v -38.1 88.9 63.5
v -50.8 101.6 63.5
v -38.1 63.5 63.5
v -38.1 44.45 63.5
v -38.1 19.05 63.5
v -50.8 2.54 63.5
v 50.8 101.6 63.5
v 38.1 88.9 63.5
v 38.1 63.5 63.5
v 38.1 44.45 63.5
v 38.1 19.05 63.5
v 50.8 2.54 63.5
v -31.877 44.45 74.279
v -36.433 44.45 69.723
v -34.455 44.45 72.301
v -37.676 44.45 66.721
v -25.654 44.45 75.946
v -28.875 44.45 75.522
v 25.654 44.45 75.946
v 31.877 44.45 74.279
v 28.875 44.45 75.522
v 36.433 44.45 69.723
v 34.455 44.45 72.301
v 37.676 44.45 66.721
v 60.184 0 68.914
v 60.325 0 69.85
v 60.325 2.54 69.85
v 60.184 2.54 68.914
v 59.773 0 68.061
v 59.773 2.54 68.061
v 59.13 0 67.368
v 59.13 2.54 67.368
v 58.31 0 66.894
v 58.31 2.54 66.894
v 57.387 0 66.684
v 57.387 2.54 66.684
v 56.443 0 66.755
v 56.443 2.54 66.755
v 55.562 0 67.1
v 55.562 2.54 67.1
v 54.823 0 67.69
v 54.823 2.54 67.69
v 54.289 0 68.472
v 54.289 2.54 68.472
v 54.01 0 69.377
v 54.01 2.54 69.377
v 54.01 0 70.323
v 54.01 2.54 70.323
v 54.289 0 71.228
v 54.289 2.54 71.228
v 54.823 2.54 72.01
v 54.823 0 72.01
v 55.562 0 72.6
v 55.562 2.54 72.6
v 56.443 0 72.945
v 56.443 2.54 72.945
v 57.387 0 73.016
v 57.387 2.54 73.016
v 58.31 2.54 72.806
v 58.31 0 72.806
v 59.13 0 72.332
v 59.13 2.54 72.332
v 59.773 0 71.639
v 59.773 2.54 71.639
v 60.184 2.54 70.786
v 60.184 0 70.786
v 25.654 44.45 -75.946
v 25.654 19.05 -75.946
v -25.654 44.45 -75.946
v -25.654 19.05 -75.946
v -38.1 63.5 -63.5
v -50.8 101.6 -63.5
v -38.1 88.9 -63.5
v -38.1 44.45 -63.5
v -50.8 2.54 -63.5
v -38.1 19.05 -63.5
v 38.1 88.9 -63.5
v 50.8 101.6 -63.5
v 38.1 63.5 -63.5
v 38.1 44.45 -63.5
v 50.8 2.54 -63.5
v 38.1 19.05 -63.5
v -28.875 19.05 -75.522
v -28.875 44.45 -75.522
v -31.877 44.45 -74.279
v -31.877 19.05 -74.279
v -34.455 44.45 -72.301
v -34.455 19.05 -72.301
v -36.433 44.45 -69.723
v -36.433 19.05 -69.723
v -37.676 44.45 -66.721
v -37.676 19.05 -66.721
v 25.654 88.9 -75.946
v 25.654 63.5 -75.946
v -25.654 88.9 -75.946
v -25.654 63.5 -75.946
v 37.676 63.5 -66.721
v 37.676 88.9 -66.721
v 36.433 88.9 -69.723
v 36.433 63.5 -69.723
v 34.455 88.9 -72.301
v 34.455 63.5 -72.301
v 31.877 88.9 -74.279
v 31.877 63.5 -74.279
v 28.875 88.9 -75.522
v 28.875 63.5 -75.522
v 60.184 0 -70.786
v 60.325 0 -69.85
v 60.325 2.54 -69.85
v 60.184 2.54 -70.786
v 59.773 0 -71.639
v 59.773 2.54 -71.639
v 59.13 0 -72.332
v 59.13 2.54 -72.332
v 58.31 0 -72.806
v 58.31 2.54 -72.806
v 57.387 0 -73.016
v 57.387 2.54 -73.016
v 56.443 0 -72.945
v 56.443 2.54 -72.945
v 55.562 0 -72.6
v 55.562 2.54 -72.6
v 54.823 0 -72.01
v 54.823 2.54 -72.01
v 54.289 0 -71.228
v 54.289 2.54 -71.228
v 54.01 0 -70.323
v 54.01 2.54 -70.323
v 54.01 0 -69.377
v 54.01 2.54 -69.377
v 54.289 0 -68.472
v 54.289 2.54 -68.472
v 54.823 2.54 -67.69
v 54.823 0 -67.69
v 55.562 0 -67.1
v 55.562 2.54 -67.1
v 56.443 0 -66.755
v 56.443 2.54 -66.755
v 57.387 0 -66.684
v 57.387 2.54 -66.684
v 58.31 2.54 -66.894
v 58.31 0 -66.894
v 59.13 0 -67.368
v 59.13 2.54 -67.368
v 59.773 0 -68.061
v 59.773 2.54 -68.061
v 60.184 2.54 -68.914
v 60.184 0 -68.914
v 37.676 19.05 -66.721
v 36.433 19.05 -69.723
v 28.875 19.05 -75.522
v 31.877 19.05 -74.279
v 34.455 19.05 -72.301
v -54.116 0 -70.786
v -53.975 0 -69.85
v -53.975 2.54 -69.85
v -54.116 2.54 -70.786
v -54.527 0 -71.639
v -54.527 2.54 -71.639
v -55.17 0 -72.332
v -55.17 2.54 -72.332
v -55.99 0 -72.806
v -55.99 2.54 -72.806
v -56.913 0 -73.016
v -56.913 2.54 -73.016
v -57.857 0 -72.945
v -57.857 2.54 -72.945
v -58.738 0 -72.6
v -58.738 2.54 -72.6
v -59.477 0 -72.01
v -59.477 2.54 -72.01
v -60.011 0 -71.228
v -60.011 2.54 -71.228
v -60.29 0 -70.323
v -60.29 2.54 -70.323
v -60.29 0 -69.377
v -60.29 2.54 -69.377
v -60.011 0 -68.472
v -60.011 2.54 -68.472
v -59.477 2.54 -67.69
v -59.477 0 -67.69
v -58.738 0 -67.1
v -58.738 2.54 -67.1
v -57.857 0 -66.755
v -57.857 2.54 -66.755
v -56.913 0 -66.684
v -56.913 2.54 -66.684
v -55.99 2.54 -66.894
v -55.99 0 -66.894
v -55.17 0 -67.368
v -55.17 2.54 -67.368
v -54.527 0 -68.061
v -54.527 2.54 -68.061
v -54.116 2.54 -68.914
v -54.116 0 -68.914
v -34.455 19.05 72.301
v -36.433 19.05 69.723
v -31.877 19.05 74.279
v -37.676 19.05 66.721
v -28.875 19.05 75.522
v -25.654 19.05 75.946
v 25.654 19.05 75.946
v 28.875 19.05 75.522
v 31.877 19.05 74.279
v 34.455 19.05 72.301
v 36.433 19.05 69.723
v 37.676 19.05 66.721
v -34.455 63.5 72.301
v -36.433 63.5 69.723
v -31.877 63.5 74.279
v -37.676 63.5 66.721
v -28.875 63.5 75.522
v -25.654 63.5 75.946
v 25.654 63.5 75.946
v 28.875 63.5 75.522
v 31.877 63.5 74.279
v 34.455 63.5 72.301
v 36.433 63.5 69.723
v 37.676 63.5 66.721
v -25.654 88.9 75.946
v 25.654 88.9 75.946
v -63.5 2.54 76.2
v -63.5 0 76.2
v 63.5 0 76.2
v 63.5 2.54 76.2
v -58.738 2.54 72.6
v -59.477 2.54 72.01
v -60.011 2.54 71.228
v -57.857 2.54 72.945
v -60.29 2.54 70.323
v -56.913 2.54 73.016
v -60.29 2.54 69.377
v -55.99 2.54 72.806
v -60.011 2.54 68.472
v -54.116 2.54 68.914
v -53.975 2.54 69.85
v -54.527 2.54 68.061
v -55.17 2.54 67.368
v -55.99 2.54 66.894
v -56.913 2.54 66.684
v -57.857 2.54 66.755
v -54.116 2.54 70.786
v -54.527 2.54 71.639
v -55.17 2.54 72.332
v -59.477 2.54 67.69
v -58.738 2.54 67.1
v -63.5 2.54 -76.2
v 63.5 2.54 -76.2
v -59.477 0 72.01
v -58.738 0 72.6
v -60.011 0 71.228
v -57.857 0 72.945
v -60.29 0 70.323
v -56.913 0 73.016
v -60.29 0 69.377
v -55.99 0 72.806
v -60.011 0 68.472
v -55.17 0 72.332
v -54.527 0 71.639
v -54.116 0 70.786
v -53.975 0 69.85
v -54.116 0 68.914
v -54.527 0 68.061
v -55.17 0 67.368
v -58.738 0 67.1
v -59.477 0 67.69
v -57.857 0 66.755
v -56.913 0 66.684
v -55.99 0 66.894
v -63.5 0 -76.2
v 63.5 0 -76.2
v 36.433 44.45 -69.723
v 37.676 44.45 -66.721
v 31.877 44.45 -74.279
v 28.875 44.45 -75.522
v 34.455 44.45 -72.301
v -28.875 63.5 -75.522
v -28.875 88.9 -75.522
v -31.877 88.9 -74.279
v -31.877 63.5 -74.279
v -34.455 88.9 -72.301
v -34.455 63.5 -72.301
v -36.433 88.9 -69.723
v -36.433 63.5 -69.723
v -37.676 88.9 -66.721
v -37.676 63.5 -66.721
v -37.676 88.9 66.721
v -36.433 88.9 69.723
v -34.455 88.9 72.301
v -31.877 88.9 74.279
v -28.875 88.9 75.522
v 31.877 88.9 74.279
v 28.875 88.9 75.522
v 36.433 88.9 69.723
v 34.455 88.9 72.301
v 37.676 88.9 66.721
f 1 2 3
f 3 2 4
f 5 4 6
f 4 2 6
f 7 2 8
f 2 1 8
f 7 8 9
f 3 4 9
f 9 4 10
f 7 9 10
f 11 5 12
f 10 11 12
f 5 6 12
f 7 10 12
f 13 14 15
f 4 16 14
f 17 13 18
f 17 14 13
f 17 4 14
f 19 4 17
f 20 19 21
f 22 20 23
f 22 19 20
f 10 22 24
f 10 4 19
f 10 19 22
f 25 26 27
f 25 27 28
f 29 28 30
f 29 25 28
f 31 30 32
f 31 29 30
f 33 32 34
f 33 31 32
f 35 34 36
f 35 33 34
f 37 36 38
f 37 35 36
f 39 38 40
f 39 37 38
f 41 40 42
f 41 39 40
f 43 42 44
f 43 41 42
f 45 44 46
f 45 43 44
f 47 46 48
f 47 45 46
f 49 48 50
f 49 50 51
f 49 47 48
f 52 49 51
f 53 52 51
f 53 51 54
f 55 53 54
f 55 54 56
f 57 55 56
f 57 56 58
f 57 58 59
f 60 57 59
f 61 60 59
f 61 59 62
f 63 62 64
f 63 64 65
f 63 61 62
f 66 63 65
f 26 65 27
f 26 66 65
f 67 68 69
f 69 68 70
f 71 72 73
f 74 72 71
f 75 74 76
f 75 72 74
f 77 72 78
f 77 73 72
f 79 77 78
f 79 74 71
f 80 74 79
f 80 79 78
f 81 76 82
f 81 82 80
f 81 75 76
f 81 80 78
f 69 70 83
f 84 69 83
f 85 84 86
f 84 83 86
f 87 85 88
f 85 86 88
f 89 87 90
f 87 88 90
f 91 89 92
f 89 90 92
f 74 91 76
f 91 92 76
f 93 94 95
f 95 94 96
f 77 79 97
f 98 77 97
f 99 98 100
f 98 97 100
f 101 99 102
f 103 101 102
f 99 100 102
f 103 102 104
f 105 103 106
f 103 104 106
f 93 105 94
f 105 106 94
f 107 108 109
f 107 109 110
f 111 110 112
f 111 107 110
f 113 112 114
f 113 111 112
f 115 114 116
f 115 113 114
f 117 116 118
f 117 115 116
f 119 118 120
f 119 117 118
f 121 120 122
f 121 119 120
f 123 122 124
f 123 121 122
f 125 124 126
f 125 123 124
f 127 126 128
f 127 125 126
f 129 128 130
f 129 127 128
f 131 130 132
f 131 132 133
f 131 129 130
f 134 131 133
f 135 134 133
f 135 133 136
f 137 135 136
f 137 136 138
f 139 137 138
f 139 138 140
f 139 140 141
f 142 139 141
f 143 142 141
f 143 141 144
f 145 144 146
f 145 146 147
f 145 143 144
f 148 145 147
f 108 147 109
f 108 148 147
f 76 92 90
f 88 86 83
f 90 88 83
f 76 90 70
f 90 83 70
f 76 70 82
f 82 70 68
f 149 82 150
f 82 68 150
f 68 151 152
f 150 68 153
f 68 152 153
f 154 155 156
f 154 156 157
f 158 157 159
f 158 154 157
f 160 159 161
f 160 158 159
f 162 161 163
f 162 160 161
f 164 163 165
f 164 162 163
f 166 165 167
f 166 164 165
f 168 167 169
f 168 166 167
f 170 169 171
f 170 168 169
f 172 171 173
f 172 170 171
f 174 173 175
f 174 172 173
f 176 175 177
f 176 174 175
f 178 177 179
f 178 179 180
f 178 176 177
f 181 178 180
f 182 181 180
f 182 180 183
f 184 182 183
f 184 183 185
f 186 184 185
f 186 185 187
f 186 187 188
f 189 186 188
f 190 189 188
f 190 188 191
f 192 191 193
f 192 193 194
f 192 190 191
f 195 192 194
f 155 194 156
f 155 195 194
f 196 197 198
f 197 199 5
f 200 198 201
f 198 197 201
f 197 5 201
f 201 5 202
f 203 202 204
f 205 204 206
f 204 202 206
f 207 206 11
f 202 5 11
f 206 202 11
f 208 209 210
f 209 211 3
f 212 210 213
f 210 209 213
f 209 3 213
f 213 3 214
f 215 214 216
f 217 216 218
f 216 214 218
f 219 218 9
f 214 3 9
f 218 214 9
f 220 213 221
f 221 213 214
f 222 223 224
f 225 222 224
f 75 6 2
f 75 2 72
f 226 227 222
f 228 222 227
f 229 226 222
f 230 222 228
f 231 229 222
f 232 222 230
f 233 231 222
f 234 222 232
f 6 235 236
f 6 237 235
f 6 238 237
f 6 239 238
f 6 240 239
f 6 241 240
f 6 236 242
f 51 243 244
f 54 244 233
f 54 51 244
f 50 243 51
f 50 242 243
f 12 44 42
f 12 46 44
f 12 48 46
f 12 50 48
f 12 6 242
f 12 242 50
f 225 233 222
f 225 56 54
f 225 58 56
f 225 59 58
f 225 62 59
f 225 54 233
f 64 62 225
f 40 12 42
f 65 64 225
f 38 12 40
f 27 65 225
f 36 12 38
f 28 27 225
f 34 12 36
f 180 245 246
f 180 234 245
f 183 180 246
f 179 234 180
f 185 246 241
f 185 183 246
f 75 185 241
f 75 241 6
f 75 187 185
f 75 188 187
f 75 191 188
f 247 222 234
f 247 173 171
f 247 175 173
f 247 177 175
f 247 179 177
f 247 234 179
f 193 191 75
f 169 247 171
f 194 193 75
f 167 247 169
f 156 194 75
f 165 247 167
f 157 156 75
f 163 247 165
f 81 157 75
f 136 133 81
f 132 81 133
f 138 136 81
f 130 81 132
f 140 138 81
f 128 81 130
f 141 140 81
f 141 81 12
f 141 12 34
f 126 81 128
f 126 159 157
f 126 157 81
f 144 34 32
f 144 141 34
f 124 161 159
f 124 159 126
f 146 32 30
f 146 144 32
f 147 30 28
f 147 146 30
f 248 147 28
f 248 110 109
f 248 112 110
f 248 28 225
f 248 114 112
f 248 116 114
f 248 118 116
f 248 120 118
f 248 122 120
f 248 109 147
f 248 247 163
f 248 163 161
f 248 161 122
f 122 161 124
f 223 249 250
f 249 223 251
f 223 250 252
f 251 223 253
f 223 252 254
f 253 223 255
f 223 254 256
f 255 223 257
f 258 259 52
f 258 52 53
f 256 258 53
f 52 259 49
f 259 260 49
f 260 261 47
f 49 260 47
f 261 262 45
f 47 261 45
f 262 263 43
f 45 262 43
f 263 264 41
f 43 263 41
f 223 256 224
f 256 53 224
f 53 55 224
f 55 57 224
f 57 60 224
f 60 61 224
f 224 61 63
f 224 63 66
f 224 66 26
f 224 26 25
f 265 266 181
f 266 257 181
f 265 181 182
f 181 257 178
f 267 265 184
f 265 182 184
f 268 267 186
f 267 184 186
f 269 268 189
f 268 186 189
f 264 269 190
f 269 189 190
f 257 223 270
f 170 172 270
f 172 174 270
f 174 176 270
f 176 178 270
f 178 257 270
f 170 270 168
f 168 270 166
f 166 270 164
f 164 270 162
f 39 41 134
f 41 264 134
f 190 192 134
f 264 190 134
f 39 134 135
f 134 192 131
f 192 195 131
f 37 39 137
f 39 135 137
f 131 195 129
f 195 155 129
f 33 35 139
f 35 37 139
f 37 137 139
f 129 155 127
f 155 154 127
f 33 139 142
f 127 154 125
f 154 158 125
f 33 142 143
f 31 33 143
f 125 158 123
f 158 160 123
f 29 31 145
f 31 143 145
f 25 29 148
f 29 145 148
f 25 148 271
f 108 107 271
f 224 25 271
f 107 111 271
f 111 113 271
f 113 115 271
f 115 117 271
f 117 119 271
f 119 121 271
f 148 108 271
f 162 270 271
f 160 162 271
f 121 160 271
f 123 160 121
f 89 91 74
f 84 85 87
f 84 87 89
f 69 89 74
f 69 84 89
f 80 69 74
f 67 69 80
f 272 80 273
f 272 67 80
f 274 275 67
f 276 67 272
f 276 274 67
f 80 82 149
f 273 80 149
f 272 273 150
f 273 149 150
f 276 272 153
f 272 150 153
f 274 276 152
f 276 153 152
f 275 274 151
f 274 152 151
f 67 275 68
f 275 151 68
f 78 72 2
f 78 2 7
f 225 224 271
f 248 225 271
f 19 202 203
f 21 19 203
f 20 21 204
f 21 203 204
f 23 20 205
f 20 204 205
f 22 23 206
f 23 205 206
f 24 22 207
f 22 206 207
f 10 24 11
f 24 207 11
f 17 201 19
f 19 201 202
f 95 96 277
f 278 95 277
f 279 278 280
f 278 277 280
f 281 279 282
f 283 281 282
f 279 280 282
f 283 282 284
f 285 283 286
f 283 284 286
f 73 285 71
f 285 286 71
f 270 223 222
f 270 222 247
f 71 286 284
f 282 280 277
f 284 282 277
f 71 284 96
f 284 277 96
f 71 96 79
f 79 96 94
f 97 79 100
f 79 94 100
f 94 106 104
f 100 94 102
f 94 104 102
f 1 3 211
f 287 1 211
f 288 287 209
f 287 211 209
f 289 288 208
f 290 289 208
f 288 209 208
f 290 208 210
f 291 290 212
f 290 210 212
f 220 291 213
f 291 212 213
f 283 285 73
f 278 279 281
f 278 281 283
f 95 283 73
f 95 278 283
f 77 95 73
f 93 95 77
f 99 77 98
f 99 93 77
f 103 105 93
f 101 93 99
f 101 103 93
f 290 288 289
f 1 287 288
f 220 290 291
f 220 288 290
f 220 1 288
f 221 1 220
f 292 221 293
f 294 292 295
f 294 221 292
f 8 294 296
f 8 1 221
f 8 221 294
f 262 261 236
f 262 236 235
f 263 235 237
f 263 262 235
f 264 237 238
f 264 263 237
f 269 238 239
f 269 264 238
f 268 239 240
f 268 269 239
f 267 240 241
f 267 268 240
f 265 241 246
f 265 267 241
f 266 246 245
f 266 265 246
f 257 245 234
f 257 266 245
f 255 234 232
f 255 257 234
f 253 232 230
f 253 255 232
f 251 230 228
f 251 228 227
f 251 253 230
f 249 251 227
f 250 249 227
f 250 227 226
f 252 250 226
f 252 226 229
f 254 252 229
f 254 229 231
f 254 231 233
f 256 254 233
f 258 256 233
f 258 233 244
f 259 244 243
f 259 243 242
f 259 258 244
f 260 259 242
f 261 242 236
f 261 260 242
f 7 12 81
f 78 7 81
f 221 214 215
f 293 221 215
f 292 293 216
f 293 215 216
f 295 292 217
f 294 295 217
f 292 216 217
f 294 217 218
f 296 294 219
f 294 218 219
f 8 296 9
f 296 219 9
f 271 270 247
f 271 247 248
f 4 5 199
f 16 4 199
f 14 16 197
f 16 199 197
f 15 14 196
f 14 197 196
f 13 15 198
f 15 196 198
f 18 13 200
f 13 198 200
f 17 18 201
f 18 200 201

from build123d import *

# Parameters (mm, degrees)
SKETCH1_W           = 127
SKETCH1_H           = 152.4
SKETCH1_R           = 3.175
SKETCH1_W_2         = 101.6
SKETCH1_H_2         = 127
BOSS_EXTRUDE1_DEPTH = 2.54
SKETCH1_4_W         = 101.6
SKETCH1_4_H         = 127
BOSS_EXTRUDE2_DEPTH = 101.6
BOSS_EXTRUDE3_START = 63.5
BOSS_EXTRUDE3_DEPTH = 25.4
BOSS_EXTRUDE4_START = 19.05
BOSS_EXTRUDE4_DEPTH = 25.4


with BuildPart() as part:
    # Sketch1 → Boss-Extrude1 (new body)
    with BuildSketch(Plane(origin=(0, 0, 0), x_dir=(1, 0, 0), z_dir=(0, 1, 0))):
        Rectangle(SKETCH1_W, SKETCH1_H)
        with Locations((-57.15, -69.85)):
            Circle(SKETCH1_R, mode=Mode.SUBTRACT)
        with Locations((57.15, -69.85)):
            Circle(SKETCH1_R, mode=Mode.SUBTRACT)
        with BuildLine():
            Line((-50.8, -63.5), (-50.8, 63.5))
            Line((-50.8, 63.5), (-38.1, 63.5))
            ThreePointArc((-38.1, 63.5), (-34.454650999, 72.300650999), (-25.654, 75.946))
            Line((-25.654, 75.946), (25.654, 75.946))
            ThreePointArc((25.654, 75.946), (34.454650999, 72.300650999), (38.1, 63.5))
            Line((38.1, 63.5), (50.8, 63.5))
            Line((50.8, 63.5), (50.8, -63.5))
            Line((50.8, -63.5), (38.1, -63.5))
            ThreePointArc((38.1, -63.5), (34.454650999, -72.300650999), (25.654, -75.946))
            Line((25.654, -75.946), (-25.654, -75.946))
            ThreePointArc((-25.654, -75.946), (-34.454650999, -72.300650999), (-38.1, -63.5))
            Line((-38.1, -63.5), (-50.8, -63.5))
        make_face(mode=Mode.SUBTRACT)
        with Locations((-57.15, 69.85)):
            Circle(SKETCH1_R, mode=Mode.SUBTRACT)
        with Locations((57.15, 69.85)):
            Circle(SKETCH1_R, mode=Mode.SUBTRACT)
        with BuildLine():
            Line((38.1, -63.5), (-38.1, -63.5))
            ThreePointArc((-38.1, -63.5), (-34.454650999, -72.300650999), (-25.654, -75.946))
            Line((-25.654, -75.946), (25.654, -75.946))
            ThreePointArc((25.654, -75.946), (34.454650999, -72.300650999), (38.1, -63.5))
        make_face()
        Rectangle(SKETCH1_W_2, SKETCH1_H_2)
        with BuildLine():
            ThreePointArc((-25.654, 75.946), (-34.454650999, 72.300650999), (-38.1, 63.5))
            Line((-38.1, 63.5), (38.1, 63.5))
            ThreePointArc((38.1, 63.5), (34.454650999, 72.300650999), (25.654, 75.946))
            Line((25.654, 75.946), (-25.654, 75.946))
        make_face()
    extrude(amount=BOSS_EXTRUDE1_DEPTH)

    # Sketch1<4> → Boss-Extrude2 (add)
    with BuildSketch(Plane(origin=(0, 0, 0), x_dir=(1, 0, 0), z_dir=(0, 1, 0))):
        Rectangle(SKETCH1_4_W, SKETCH1_4_H)
    extrude(amount=BOSS_EXTRUDE2_DEPTH)

    # Sketch1<5> → Boss-Extrude3 (add)
    with BuildSketch(Plane(origin=(0, 0, 0), x_dir=(1, 0, 0), z_dir=(0, 1, 0)).offset(BOSS_EXTRUDE3_START)):
        with BuildLine():
            Line((38.1, -63.5), (-38.1, -63.5))
            ThreePointArc((-38.1, -63.5), (-34.454650999, -72.300650999), (-25.654, -75.946))
            Line((-25.654, -75.946), (25.654, -75.946))
            ThreePointArc((25.654, -75.946), (34.454650999, -72.300650999), (38.1, -63.5))
        make_face()
        with BuildLine():
            Line((25.654, 75.946), (-25.654, 75.946))
            ThreePointArc((-25.654, 75.946), (-34.454650999, 72.300650999), (-38.1, 63.5))
            Line((-38.1, 63.5), (38.1, 63.5))
            ThreePointArc((38.1, 63.5), (34.454650999, 72.300650999), (25.654, 75.946))
        make_face()
    extrude(amount=BOSS_EXTRUDE3_DEPTH)

    # Sketch1<6> → Boss-Extrude4 (add)
    with BuildSketch(Plane(origin=(0, 0, 0), x_dir=(1, 0, 0), z_dir=(0, 1, 0)).offset(BOSS_EXTRUDE4_START)):
        with BuildLine():
            Line((38.1, -63.5), (-38.1, -63.5))
            ThreePointArc((-38.1, -63.5), (-34.454650999, -72.300650999), (-25.654, -75.946))
            Line((-25.654, -75.946), (25.654, -75.946))
            ThreePointArc((25.654, -75.946), (34.454650999, -72.300650999), (38.1, -63.5))
        make_face()
        with BuildLine():
            ThreePointArc((-25.654, 75.946), (-34.454650999, 72.300650999), (-38.1, 63.5))
            Line((-38.1, 63.5), (38.1, 63.5))
            ThreePointArc((38.1, 63.5), (34.454650999, 72.300650999), (25.654, 75.946))
            Line((25.654, 75.946), (-25.654, 75.946))
        make_face()
    extrude(amount=BOSS_EXTRUDE4_DEPTH)


solid = part.part
